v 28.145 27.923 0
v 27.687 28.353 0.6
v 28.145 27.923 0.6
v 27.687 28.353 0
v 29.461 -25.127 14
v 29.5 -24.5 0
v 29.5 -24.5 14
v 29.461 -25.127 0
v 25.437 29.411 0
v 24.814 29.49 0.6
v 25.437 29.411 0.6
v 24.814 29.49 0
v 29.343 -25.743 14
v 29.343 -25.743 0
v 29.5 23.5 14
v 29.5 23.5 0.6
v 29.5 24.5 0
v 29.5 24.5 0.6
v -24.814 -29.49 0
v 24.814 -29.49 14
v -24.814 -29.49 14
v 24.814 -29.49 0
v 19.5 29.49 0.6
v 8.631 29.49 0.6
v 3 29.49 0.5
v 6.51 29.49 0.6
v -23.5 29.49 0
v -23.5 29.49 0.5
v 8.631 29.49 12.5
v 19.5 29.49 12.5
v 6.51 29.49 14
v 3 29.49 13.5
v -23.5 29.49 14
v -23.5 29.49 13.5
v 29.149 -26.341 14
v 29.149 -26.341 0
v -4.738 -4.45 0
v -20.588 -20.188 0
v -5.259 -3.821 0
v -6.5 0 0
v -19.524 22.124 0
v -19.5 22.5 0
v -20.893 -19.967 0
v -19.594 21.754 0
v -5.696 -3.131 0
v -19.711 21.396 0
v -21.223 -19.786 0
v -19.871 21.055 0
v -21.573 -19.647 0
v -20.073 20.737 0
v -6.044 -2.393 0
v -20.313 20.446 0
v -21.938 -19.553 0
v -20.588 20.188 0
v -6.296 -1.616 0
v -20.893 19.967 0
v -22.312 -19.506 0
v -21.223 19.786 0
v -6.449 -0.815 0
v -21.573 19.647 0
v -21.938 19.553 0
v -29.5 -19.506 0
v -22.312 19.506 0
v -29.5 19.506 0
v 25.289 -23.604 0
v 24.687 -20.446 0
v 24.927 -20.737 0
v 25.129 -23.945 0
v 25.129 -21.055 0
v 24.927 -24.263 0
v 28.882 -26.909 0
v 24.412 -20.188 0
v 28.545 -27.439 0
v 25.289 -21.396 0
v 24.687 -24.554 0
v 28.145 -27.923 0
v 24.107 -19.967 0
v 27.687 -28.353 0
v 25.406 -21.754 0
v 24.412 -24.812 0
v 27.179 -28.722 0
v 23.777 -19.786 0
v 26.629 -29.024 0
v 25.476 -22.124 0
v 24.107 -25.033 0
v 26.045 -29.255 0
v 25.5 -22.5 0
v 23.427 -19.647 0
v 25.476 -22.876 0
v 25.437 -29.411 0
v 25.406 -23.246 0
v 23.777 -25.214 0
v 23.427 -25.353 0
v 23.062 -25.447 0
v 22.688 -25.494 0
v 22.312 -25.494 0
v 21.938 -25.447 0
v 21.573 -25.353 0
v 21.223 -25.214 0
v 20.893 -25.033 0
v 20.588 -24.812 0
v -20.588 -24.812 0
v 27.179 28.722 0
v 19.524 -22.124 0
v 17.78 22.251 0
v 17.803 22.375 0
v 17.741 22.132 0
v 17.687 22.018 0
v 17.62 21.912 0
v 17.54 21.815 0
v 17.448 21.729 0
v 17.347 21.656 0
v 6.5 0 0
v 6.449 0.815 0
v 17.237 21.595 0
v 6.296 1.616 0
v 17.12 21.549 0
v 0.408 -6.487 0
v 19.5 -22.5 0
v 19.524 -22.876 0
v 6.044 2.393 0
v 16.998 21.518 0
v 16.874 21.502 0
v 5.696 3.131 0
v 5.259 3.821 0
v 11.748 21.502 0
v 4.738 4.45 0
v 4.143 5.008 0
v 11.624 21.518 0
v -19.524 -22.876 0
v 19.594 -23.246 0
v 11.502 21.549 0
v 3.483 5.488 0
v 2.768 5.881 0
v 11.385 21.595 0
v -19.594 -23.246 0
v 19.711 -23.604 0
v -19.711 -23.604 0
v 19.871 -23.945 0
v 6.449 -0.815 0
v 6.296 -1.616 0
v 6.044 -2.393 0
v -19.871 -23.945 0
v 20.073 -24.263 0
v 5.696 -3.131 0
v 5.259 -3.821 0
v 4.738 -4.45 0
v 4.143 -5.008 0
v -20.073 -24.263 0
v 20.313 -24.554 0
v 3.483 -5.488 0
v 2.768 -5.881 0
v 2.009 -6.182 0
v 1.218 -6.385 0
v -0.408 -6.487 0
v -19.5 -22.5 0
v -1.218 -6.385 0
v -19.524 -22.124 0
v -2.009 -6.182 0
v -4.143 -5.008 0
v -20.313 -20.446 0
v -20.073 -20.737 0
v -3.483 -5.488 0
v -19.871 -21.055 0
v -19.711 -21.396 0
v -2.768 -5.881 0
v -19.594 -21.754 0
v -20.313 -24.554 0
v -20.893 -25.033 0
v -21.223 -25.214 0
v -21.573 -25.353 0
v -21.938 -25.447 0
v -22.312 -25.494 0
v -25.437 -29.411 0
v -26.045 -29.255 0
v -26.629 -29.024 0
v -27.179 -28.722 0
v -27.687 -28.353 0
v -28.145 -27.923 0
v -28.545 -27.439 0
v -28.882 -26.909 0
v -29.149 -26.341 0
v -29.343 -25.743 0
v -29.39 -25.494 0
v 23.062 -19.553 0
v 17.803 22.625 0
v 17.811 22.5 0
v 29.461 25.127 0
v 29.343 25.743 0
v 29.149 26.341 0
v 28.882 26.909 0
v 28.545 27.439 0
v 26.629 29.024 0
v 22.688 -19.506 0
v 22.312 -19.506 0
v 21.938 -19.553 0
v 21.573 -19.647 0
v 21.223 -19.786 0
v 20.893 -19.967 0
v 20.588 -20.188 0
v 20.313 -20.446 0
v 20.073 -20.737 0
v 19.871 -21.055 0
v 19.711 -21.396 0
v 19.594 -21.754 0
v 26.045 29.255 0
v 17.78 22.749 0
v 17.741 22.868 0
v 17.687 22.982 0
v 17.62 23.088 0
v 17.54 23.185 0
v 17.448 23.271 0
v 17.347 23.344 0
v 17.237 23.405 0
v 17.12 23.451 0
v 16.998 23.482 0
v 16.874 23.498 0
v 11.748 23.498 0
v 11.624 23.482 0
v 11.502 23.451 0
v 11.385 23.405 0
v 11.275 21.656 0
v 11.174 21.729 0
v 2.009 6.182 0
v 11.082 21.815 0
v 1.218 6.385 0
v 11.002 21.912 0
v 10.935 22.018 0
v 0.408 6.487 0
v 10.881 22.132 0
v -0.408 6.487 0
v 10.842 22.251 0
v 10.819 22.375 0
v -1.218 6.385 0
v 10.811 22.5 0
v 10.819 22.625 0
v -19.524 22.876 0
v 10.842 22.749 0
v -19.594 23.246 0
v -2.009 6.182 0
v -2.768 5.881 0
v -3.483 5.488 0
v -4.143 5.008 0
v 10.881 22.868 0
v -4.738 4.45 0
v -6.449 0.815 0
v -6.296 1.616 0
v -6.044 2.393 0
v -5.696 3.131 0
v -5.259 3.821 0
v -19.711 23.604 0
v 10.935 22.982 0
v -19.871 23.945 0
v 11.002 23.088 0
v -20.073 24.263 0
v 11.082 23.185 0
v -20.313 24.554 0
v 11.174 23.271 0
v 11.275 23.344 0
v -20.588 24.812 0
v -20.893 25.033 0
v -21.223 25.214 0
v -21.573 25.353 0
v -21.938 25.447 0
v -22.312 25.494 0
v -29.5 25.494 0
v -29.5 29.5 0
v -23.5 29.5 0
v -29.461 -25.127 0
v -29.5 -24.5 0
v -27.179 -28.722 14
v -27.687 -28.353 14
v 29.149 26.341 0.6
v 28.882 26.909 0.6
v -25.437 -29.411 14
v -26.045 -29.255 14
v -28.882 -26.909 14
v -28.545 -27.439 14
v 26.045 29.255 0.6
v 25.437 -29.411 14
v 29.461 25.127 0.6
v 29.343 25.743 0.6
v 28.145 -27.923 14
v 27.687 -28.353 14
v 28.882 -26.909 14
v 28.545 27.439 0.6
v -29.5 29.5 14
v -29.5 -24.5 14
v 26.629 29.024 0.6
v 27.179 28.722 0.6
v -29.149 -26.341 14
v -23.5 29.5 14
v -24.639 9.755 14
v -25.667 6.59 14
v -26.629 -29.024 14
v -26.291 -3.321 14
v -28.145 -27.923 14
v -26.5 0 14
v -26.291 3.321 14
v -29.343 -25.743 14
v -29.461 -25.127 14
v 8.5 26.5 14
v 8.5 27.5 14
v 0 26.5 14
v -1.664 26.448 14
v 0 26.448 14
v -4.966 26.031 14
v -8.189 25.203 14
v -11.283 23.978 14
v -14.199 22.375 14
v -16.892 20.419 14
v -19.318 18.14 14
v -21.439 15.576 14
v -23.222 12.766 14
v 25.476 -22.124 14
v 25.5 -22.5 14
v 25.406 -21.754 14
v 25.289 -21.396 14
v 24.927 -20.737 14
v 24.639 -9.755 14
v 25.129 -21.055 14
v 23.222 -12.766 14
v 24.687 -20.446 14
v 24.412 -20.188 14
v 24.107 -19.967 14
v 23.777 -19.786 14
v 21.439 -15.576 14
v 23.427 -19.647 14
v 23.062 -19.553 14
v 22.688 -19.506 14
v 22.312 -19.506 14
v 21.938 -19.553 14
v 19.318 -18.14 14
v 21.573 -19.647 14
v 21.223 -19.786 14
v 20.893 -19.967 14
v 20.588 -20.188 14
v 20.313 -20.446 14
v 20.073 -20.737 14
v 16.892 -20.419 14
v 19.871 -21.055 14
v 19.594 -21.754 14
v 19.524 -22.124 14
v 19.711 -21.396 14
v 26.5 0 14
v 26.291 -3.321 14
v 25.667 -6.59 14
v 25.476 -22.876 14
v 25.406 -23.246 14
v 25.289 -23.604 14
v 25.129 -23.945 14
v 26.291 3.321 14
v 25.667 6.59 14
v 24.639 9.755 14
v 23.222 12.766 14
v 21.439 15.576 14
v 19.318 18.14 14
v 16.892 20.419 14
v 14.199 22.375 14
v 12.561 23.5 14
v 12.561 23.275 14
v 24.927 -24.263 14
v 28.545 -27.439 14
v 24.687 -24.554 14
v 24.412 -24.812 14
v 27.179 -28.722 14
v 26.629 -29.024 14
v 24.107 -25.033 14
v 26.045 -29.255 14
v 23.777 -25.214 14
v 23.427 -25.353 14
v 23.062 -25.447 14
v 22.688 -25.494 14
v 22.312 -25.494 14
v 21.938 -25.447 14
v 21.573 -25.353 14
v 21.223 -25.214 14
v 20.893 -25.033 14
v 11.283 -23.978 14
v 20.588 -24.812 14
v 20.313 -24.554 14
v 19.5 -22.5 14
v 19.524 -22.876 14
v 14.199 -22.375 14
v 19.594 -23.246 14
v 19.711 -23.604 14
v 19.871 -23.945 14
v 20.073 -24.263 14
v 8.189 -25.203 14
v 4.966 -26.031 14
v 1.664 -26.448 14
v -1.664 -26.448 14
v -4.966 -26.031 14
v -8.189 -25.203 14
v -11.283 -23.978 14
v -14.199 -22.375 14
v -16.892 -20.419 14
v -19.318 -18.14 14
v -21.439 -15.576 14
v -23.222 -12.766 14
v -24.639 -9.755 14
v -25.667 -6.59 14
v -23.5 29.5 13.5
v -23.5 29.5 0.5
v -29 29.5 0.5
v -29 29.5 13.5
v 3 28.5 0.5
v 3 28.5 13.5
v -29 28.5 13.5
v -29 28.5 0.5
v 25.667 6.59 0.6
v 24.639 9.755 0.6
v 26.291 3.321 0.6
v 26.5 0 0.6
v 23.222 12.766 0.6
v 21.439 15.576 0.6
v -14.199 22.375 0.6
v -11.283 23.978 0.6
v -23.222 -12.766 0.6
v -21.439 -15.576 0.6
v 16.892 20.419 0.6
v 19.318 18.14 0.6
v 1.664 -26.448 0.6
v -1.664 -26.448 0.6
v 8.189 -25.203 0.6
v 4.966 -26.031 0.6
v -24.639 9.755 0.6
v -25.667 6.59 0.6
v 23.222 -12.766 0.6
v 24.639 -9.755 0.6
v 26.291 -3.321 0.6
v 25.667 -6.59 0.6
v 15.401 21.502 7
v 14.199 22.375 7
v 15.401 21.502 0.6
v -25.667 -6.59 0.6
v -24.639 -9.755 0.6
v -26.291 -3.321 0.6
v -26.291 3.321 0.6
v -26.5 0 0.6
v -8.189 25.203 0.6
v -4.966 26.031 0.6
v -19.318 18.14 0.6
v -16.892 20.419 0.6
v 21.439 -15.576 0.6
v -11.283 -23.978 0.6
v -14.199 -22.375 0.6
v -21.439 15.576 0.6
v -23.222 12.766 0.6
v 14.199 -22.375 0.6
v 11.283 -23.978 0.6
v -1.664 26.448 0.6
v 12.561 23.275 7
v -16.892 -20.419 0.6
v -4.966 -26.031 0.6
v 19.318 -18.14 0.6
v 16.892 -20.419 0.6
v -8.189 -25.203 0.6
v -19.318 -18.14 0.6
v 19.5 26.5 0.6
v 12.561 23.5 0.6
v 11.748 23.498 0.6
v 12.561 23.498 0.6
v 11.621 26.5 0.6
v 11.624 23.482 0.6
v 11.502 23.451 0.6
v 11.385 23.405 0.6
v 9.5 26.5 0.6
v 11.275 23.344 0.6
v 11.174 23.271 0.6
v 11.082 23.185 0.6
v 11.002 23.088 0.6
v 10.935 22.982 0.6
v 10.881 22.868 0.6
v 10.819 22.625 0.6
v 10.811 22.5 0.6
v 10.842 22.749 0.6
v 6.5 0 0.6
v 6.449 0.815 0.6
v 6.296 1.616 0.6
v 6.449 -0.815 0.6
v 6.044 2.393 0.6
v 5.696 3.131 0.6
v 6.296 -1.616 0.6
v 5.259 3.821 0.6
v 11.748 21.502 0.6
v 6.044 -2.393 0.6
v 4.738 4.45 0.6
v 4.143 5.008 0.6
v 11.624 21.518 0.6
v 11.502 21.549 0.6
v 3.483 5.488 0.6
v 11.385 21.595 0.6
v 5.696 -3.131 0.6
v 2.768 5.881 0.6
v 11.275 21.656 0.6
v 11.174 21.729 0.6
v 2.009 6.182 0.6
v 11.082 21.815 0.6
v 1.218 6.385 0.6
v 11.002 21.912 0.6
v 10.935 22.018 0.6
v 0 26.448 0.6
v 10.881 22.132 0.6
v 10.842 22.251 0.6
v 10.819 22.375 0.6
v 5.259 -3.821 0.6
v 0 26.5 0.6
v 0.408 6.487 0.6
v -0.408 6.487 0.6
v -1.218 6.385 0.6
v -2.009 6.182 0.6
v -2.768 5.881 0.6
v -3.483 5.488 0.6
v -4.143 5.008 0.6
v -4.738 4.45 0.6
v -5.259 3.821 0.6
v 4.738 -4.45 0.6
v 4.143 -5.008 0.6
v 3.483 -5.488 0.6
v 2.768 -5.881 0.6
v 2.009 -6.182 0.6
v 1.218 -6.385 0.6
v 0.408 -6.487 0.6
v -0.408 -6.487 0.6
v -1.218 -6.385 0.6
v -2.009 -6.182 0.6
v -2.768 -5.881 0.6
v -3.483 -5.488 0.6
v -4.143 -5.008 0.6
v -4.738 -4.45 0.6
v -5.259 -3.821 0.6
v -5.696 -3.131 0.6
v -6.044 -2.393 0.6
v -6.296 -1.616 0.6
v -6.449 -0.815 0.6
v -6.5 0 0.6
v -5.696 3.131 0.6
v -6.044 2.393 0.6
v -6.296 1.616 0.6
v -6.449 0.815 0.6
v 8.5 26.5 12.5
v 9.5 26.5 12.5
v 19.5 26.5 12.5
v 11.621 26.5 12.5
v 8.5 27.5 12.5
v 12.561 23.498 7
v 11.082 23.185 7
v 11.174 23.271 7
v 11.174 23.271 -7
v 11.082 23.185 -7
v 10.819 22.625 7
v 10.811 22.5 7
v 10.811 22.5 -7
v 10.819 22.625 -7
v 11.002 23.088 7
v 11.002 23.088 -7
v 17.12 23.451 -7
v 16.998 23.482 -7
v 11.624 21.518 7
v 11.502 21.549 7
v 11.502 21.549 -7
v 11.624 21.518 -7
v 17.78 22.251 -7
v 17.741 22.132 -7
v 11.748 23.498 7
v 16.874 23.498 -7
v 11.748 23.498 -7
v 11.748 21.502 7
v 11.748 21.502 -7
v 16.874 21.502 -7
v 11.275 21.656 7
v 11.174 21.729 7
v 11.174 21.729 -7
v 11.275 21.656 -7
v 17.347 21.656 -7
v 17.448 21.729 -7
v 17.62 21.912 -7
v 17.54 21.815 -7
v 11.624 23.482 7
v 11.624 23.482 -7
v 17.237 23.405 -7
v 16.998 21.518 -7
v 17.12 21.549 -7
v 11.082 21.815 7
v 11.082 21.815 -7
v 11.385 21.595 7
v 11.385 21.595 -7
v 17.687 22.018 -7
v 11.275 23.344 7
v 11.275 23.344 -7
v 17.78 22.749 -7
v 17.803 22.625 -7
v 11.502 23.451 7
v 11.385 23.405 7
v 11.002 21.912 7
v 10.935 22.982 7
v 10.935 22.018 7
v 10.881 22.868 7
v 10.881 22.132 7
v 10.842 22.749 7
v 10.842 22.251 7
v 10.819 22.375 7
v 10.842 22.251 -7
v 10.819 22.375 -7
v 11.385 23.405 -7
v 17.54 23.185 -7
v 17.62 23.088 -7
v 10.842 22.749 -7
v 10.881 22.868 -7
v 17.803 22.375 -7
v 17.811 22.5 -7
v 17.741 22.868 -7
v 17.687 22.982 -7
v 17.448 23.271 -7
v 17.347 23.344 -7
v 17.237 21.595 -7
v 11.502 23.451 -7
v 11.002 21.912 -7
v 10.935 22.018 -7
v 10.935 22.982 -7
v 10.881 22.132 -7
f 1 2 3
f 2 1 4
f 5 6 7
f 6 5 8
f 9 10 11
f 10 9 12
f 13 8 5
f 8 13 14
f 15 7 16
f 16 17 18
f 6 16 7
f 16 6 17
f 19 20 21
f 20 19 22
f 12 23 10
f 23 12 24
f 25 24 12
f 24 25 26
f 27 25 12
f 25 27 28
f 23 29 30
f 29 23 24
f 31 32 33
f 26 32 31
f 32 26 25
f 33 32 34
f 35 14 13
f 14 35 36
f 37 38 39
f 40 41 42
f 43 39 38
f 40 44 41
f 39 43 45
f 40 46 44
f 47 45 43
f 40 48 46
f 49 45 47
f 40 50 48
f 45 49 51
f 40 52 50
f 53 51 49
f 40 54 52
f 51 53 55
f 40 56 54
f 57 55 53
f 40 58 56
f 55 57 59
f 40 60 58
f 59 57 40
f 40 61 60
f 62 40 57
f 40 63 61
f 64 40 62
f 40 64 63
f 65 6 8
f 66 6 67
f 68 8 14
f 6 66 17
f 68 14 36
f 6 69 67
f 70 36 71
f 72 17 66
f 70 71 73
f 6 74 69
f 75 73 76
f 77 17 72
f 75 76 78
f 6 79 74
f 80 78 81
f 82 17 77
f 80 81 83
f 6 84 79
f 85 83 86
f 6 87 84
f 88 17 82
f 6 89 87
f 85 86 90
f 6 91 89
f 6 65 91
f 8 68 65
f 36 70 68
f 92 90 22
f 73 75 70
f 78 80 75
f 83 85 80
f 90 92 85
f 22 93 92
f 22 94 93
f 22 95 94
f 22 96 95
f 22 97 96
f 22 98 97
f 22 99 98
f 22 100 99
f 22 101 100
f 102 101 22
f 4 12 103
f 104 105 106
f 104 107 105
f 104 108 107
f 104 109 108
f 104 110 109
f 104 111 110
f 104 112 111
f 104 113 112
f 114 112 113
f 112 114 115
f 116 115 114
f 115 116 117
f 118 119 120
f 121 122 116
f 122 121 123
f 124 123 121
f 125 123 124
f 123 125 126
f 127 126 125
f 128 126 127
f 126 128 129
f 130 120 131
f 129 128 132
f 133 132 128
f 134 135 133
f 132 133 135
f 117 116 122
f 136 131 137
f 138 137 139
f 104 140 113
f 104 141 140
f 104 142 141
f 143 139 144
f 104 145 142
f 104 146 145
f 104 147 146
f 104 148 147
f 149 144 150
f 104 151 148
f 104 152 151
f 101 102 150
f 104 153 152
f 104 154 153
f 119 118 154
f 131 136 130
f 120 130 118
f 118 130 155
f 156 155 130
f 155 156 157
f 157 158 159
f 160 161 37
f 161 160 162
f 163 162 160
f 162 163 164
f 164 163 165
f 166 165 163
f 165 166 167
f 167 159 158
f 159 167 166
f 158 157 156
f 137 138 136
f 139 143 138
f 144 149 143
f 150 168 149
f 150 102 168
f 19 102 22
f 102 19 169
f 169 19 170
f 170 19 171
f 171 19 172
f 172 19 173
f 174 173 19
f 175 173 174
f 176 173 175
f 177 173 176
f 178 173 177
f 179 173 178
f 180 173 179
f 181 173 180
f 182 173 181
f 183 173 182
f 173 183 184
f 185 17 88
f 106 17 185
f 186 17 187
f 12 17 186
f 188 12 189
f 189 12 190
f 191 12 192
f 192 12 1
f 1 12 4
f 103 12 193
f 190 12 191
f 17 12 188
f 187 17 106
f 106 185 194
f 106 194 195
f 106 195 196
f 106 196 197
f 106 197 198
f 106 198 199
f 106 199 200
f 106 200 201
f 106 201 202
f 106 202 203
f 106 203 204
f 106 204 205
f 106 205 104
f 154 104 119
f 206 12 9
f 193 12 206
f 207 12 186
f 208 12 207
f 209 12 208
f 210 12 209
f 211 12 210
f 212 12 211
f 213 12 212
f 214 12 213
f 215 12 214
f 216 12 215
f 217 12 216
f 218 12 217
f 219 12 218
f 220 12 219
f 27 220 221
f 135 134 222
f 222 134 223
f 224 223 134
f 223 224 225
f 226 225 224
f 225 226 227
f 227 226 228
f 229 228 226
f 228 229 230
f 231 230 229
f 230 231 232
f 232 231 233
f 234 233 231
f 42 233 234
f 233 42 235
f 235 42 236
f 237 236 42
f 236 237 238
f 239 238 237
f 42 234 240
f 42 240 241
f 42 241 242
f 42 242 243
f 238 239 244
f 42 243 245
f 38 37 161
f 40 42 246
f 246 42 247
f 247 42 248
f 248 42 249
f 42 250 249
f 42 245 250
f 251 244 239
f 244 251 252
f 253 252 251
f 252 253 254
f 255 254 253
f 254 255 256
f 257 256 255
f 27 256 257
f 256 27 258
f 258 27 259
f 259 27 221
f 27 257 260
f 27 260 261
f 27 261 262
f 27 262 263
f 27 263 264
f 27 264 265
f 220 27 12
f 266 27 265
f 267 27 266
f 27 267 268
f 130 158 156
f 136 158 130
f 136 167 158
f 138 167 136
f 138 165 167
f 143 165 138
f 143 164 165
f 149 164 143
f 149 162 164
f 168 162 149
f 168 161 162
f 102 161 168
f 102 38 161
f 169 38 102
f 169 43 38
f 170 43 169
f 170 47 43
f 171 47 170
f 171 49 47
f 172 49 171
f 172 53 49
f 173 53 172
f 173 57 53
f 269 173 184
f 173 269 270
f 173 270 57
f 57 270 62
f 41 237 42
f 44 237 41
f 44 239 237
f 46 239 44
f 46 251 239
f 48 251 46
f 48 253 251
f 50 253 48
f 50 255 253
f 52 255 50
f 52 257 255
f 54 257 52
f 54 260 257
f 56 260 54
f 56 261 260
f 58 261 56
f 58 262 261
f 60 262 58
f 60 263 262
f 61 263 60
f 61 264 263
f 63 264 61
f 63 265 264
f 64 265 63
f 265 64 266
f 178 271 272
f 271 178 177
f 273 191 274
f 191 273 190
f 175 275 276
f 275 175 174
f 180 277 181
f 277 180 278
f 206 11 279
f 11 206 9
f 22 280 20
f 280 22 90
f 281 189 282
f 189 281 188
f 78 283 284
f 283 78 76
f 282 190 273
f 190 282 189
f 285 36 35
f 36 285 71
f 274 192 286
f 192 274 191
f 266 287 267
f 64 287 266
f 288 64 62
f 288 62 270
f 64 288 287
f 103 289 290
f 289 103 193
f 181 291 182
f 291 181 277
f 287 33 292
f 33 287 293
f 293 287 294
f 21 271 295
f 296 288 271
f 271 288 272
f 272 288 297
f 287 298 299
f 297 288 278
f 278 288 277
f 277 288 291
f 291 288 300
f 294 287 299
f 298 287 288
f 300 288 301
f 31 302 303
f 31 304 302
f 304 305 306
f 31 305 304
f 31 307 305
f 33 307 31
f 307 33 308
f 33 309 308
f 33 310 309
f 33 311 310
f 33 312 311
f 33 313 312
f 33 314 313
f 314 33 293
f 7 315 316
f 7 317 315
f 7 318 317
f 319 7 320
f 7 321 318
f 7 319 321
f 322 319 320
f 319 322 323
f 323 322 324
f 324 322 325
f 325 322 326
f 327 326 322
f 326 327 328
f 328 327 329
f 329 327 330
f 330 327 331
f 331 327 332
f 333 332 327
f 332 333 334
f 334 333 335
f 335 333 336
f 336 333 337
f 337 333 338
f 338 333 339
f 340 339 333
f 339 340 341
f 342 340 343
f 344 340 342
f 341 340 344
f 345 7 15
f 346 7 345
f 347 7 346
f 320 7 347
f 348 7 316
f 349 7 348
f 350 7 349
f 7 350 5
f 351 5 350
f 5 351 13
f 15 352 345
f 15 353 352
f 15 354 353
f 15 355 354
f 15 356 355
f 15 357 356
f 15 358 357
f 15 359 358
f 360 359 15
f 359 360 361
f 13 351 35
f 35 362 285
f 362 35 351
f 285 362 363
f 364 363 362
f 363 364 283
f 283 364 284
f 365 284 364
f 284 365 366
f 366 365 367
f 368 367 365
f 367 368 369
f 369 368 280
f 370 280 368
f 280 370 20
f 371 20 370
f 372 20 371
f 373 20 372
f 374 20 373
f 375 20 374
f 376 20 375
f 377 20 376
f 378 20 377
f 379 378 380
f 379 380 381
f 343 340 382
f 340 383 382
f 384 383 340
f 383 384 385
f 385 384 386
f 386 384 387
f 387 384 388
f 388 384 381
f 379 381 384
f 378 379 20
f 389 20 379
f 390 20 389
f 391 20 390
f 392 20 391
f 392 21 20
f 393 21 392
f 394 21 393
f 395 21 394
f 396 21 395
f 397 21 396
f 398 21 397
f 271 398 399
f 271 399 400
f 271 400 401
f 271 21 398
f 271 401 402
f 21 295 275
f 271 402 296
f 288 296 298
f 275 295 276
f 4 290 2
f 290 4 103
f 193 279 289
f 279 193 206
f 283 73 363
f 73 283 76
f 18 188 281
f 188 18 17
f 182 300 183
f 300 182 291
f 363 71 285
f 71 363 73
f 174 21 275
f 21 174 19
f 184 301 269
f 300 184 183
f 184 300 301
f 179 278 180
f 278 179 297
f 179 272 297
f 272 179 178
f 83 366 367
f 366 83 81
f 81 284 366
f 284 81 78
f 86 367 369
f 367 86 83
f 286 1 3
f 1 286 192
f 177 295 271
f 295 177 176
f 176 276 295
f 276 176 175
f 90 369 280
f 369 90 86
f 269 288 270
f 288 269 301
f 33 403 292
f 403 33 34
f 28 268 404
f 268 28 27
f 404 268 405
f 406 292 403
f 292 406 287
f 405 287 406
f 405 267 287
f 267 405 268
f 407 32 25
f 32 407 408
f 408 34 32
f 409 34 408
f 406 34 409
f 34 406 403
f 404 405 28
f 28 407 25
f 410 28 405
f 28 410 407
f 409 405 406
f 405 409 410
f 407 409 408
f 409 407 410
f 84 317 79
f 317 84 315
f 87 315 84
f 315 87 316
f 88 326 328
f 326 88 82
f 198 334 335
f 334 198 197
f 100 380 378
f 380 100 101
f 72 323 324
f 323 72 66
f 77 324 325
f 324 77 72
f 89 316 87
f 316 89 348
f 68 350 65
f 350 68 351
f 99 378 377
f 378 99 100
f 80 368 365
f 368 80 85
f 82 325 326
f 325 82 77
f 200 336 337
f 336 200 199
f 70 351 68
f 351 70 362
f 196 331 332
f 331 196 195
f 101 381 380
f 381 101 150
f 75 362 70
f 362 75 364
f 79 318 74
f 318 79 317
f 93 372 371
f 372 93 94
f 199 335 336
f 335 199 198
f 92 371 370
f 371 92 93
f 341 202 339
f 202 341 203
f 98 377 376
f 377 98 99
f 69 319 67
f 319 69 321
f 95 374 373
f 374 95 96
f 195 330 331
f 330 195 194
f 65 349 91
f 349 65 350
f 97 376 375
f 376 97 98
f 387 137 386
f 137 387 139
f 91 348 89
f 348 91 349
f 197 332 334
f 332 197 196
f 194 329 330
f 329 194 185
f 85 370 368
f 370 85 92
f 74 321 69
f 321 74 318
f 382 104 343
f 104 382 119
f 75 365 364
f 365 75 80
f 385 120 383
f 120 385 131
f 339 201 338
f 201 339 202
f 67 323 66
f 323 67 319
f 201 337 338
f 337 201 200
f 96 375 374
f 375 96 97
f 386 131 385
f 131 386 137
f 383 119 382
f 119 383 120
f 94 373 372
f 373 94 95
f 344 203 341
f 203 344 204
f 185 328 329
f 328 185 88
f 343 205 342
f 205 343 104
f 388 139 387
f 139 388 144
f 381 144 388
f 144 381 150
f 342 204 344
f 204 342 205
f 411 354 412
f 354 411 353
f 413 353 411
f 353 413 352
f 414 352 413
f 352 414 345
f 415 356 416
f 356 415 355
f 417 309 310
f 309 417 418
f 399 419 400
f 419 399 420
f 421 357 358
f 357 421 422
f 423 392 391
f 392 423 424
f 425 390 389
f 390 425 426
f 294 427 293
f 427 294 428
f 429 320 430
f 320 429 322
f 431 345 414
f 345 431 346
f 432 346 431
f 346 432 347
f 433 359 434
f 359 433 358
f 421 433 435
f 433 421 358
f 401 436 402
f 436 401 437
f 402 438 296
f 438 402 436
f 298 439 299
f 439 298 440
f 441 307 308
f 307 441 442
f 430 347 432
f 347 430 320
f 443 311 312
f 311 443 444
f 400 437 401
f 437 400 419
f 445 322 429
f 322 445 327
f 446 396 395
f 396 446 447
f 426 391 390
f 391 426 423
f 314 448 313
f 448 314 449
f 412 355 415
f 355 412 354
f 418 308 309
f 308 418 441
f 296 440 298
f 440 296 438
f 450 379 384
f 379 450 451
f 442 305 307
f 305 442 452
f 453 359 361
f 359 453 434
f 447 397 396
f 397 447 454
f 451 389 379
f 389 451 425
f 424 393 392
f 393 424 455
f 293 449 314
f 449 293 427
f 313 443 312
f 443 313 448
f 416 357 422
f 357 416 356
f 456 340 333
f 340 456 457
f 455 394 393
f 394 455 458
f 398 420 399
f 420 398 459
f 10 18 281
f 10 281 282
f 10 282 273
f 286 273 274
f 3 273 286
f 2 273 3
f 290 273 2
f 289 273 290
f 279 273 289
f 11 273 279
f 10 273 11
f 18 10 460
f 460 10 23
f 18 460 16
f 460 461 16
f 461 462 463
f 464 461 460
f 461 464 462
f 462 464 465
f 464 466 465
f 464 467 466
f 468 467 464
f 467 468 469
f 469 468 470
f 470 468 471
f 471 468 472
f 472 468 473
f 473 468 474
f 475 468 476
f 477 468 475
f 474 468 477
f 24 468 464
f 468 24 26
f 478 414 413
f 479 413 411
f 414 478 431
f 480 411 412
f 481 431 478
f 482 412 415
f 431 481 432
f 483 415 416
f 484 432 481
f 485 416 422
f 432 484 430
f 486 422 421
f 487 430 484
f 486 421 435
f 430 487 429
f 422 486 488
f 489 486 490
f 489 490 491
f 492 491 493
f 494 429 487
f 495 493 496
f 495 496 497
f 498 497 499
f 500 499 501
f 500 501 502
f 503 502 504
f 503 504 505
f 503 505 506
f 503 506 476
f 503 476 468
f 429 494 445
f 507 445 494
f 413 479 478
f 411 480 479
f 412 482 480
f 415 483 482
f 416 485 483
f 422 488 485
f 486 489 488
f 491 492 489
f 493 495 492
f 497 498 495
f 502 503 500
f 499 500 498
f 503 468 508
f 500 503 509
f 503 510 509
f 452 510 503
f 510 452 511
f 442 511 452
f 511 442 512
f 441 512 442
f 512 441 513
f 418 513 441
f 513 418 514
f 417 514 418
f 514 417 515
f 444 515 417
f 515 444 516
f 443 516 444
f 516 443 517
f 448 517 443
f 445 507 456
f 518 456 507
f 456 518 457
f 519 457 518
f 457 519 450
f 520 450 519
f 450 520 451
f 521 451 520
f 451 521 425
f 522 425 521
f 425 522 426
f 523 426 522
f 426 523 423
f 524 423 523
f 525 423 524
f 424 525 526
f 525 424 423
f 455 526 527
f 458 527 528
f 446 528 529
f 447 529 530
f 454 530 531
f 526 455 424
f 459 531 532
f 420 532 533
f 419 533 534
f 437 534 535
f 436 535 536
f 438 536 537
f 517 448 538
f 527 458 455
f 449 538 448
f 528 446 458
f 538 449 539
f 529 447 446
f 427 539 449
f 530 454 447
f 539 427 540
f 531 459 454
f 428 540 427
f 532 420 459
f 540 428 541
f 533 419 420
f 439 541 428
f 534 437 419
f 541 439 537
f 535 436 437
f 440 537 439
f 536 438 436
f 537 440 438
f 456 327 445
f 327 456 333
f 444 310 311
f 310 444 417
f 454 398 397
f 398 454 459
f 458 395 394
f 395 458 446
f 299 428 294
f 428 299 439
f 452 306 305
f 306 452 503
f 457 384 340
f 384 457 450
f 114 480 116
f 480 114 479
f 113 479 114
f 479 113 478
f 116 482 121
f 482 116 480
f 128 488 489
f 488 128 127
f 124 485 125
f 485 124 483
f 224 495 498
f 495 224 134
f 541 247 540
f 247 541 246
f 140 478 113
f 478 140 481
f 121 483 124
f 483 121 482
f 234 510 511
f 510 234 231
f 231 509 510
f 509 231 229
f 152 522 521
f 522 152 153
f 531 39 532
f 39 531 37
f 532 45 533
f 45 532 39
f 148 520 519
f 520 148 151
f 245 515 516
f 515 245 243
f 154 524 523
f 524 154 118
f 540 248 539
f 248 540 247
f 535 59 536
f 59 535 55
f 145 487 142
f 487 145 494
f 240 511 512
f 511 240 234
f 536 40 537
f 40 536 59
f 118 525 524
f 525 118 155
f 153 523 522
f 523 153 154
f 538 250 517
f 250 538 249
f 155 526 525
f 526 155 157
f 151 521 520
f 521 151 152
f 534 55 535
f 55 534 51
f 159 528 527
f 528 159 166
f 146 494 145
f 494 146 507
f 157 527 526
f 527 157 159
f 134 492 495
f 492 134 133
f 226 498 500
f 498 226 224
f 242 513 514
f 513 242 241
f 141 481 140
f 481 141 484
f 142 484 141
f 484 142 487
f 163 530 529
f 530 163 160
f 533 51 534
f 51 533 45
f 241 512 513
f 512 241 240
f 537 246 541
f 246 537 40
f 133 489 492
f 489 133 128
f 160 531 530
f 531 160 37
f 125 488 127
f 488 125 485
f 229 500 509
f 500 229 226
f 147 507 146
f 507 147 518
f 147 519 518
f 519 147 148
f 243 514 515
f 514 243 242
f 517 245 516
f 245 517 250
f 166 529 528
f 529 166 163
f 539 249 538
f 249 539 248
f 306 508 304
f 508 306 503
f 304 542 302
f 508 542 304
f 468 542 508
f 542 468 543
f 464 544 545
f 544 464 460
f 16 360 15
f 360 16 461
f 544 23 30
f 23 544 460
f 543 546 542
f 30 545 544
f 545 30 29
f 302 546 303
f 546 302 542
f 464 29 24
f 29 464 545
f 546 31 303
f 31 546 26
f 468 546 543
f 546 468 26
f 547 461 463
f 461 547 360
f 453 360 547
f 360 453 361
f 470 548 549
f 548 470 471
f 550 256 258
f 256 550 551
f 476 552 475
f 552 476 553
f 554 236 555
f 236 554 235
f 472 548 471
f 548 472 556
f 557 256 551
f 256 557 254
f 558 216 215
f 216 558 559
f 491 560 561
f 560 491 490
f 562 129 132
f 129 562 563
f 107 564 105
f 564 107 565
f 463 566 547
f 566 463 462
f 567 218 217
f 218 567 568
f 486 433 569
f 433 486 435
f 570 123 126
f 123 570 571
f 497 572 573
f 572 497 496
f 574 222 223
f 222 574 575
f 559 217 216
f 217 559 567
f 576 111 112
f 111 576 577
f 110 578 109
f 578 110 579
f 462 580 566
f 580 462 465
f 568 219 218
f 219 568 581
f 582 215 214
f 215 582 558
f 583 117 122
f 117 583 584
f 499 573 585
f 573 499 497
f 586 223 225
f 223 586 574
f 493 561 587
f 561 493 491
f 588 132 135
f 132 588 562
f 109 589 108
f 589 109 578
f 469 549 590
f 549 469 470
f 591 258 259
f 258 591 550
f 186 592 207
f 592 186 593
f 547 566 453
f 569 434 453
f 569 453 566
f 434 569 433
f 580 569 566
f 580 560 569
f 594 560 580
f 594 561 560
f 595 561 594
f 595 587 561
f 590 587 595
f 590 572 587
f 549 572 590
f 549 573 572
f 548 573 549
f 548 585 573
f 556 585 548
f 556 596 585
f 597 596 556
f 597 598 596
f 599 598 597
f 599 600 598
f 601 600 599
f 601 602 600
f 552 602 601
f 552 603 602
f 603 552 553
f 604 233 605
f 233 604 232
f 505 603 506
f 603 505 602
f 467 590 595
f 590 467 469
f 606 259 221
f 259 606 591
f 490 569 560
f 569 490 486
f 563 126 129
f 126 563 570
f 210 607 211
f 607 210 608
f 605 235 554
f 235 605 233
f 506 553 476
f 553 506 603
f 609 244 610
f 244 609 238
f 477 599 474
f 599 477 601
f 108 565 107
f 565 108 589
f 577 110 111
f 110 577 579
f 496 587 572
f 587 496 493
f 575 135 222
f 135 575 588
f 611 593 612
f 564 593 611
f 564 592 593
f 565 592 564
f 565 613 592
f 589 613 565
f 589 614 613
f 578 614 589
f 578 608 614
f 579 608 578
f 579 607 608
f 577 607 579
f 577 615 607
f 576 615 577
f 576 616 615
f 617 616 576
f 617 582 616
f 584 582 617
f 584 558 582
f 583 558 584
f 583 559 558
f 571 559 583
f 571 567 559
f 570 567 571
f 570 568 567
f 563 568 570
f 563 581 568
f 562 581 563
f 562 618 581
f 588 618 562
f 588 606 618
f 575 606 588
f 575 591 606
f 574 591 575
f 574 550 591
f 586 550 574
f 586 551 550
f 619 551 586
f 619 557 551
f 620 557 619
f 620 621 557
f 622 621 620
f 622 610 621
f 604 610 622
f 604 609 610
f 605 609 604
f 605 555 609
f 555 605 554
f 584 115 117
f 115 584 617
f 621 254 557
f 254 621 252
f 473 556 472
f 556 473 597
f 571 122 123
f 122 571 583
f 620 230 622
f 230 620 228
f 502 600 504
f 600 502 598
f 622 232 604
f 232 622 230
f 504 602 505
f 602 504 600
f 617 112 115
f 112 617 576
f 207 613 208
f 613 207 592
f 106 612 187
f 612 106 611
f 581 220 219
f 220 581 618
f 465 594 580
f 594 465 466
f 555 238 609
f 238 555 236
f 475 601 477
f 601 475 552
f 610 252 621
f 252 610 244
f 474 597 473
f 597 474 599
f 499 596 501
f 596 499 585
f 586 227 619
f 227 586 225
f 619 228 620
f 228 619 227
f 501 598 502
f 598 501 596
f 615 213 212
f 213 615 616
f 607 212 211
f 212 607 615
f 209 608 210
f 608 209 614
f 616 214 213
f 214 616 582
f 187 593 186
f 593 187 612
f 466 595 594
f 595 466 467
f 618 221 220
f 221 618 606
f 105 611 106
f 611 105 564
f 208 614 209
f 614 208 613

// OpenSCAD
$fn = 50;


union() {
	difference() {
		union() {
			hull() {
				translate(v = [-24.5000000000, 24.5000000000, 0]) {
					cylinder(h = 14, r = 5);
				}
				translate(v = [24.5000000000, 24.5000000000, 0]) {
					cylinder(h = 14, r = 5);
				}
				translate(v = [-24.5000000000, -24.5000000000, 0]) {
					cylinder(h = 14, r = 5);
				}
				translate(v = [24.5000000000, -24.5000000000, 0]) {
					cylinder(h = 14, r = 5);
				}
			}
			translate(v = [-29.5000000000, 23.5000000000, 0]) {
				cube(size = [6, 6, 14]);
			}
		}
		union() {
			translate(v = [-30.0000000000, -22.5000000000, -250.0000000000]) {
				rotate(a = [0, 0, 0]) {
					difference() {
						union() {
							hull() {
								translate(v = [7.5000000000, 0, 0]) {
									cylinder(h = 250, r = 3.0000000000, r1 = 3.0000000000, r2 = 3.0000000000);
								}
								translate(v = [-7.5000000000, 0, 0]) {
									cylinder(h = 250, r = 3.0000000000, r1 = 3.0000000000, r2 = 3.0000000000);
								}
							}
						}
						union();
					}
				}
			}
			translate(v = [-30.0000000000, 22.5000000000, -250.0000000000]) {
				rotate(a = [0, 0, 0]) {
					difference() {
						union() {
							hull() {
								translate(v = [7.5000000000, 0, 0]) {
									cylinder(h = 250, r = 3.0000000000, r1 = 3.0000000000, r2 = 3.0000000000);
								}
								translate(v = [-7.5000000000, 0, 0]) {
									cylinder(h = 250, r = 3.0000000000, r1 = 3.0000000000, r2 = 3.0000000000);
								}
							}
						}
						union();
					}
				}
			}
			translate(v = [-29.0000000000, 28.5000000000, 0.5000000000]) {
				cube(size = [32, 1, 13.0000000000]);
			}
			translate(v = [22.5000000000, -22.5000000000, 0]) {
				cylinder(h = 100, r = 3.0000000000);
			}
			translate(v = [0, 0, 0.6000000000]) {
				cylinder(h = 16.4000000000, r = 26.5000000000);
			}
			translate(v = [0, 0, -7.0000000000]) {
				cylinder(h = 14, r = 6.5000000000);
			}
			translate(v = [0.0000000000, 23.5000000000, 0.6000000000]) {
				cube(size = [29.5000000000, 3, 16.4000000000]);
			}
			translate(v = [19.5000000000, 23.5000000000, 0.6000000000]) {
				cube(size = [10, 6, 16.4000000000]);
			}
			translate(v = [8.5000000000, 23.5000000000, 12.5000000000]) {
				cube(size = [21, 6, 1.5000000000]);
			}
			translate(v = [5.7500000000, 30.2500000000, 0.6000000000]) {
				rotate(a = [0, 0, -45]) {
					cube(size = [7.5000000000, 1.5000000000, 16.4000000000]);
				}
			}
			translate(v = [5.0610000000, 21.5000000000, 0.6000000000]) {
				cube(size = [7.5000000000, 2, 13.4000000000]);
			}
		}
	}
	union() {
		translate(v = [14.3110000000, 22.5000000000, -7.0000000000]) {
			rotate(a = [0, 0, 0]) {
				difference() {
					union() {
						#hull() {
							#translate(v = [2.5000000000, 0, 0]) {
								cylinder(h = 14, r = 1.0000000000, r1 = 1.0000000000, r2 = 1.0000000000);
							}
							#translate(v = [-2.5000000000, 0, 0]) {
								cylinder(h = 14, r = 1.0000000000, r1 = 1.0000000000, r2 = 1.0000000000);
							}
						}
					}
					union();
				}
			}
		}
	}
}
